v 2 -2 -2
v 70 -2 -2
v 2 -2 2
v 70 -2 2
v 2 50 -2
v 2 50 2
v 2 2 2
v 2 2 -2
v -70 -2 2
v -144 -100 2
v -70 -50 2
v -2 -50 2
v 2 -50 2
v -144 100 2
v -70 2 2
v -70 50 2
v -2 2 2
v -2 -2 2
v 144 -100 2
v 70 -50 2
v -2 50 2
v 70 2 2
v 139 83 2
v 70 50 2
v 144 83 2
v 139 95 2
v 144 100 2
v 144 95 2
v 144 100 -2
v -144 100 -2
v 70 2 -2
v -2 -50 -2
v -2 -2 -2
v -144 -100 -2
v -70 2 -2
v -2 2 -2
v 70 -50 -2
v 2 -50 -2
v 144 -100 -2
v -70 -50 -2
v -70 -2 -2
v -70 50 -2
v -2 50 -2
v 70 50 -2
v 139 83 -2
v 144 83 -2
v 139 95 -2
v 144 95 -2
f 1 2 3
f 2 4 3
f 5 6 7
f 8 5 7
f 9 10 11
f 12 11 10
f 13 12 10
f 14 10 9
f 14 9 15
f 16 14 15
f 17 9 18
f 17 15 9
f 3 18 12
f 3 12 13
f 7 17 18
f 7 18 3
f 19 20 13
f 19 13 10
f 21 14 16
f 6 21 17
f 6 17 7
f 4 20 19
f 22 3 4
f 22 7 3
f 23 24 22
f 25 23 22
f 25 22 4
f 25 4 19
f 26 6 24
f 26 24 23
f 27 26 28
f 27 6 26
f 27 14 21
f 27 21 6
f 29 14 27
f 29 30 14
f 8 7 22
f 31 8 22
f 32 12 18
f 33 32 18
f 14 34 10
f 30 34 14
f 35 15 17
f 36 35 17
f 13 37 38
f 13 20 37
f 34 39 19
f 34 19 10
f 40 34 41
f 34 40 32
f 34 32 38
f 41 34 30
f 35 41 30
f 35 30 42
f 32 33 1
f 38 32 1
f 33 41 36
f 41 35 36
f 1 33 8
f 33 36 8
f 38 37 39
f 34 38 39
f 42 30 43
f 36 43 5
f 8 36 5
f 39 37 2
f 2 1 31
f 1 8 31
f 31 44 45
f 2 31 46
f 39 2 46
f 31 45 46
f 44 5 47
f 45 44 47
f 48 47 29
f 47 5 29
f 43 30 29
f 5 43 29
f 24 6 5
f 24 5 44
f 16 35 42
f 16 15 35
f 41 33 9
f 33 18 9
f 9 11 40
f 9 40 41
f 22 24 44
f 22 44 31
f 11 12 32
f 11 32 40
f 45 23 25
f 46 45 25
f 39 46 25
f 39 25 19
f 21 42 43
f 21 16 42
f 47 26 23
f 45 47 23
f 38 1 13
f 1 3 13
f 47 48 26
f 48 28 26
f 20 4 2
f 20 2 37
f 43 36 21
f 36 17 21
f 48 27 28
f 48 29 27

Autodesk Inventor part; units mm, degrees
ref_plane "YZ Plane" through (0, 0, 0) normal (1, 0, 0) x (0, 1, 0)
ref_plane "XZ Plane" through (0, 0, 0) normal (0, 1, 0) x (-1, 0, 0)
ref_plane "XY Plane" through (0, 0, 0) normal (0, 0, 1) x (1, 0, 0)
sketch "Szkic1" plane through (0, 0, 0) normal (0, 0, 1) x (1, 0, 0)
  line L0 (-144, 100) -> (144, 100)
  line L1 (144, 100) -> (144, -100)
  line L2 (144, -100) -> (-144, -100)
  line L3 (-144, -100) -> (-144, 100)
  line L4 (-144, 100) -> (144, -100) construction
  line L5 (144, 100) -> (-144, -100) construction
  point P0 (0, 0)
  dimension "d0" = 288
  dimension "d1" = 200
extrude "Wyciągnięcie proste1" add sketch "Szkic1" along normal mid plane 4
sketch "Szkic2" plane through (0, 0, 2) normal (0, 0, 1) x (1, 0, 0)
  line L0 (70, -50) -> (-70, -50)
  line L1 (-70, -50) -> (-70, 50)
  line L2 (-70, 50) -> (70, 50)
  line L3 (70, 50) -> (70, -50)
  line L4 (70, -50) -> (-70, 50) construction
  line L5 (-70, -50) -> (70, 50) construction
  line L6 (-2, 50) -> (2, 50)
  line L7 (2, 50) -> (2, -50)
  line L8 (2, -50) -> (-2, -50)
  line L9 (-2, -50) -> (-2, 50)
  line L10 (-70, 2) -> (70, 2)
  line L11 (70, 2) -> (70, -2)
  line L12 (70, -2) -> (-70, -2)
  line L13 (-70, -2) -> (-70, 2)
  line L14 (144, -100) -> (144, 100) projected
  line L15 (144, 95) -> (139, 95)
  line L16 (139, 95) -> (139, 83)
  line L17 (139, 83) -> (144, 83)
  line L18 (144, 83) -> (144, 95)
  line L19 (144, 100) -> (-144, 100) projected
  point P0 (0, 0)
  point P1 (2, -2)
  point P2 (-2, -2)
  point P3 (2, 2)
  point P4 (-2, 2)
  point P5 (144, 83)
  dimension "d4" = 140
  dimension "d5" = 100
  dimension "d6" = 4
  dimension "d7" = 100
  dimension "d8" = 68
  dimension "d9" = 4
  dimension "d10" = 48
  dimension "d13" = 5
  dimension "d14" = 12
  dimension "d15" = 5
extrude "Wyciągnięcie proste2" cut sketch "Szkic2" against normal through all contours L0 L7 L12 L3 | L0 L1 L12 L9 | L10 L7 L2 L3 | L10 L1 L2 L9
extrude "Wyciągnięcie proste3" cut sketch "Szkic2" against normal through all contours L17 L16 L15 L14
properties part number "LeftWall_Window"
